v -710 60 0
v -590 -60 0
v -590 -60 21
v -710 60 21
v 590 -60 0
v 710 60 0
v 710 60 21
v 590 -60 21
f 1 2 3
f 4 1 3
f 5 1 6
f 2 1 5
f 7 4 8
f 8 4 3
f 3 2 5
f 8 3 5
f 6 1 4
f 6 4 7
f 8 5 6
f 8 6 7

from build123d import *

# Parameters (mm, degrees)
F0_W     = 1420
F0_H     = 120
F1_DEPTH = 21
F2_SIZE  = 119.99999


# Not quite as in the source:
# - a fillet or chamfer is up to 0.001 mm smaller than in the source, because OpenCascade refuses the exact size


with BuildPart() as f1:
    # F0 (on Top) → F1 (new body)
    with BuildSketch(Plane.XY):
        Rectangle(F0_W, F0_H)
    extrude(amount=F1_DEPTH)

    # F2 (size 120 in the source; OpenCascade refuses exactly that, so slightly less here)
    f2_edges = [f1.edges().sort_by_distance(p)[0] for p in [
        (-710, -60, 10.5),
        (710, -60, 10.5),
    ]]
    chamfer(f2_edges, length=F2_SIZE)


solid = f1.part
